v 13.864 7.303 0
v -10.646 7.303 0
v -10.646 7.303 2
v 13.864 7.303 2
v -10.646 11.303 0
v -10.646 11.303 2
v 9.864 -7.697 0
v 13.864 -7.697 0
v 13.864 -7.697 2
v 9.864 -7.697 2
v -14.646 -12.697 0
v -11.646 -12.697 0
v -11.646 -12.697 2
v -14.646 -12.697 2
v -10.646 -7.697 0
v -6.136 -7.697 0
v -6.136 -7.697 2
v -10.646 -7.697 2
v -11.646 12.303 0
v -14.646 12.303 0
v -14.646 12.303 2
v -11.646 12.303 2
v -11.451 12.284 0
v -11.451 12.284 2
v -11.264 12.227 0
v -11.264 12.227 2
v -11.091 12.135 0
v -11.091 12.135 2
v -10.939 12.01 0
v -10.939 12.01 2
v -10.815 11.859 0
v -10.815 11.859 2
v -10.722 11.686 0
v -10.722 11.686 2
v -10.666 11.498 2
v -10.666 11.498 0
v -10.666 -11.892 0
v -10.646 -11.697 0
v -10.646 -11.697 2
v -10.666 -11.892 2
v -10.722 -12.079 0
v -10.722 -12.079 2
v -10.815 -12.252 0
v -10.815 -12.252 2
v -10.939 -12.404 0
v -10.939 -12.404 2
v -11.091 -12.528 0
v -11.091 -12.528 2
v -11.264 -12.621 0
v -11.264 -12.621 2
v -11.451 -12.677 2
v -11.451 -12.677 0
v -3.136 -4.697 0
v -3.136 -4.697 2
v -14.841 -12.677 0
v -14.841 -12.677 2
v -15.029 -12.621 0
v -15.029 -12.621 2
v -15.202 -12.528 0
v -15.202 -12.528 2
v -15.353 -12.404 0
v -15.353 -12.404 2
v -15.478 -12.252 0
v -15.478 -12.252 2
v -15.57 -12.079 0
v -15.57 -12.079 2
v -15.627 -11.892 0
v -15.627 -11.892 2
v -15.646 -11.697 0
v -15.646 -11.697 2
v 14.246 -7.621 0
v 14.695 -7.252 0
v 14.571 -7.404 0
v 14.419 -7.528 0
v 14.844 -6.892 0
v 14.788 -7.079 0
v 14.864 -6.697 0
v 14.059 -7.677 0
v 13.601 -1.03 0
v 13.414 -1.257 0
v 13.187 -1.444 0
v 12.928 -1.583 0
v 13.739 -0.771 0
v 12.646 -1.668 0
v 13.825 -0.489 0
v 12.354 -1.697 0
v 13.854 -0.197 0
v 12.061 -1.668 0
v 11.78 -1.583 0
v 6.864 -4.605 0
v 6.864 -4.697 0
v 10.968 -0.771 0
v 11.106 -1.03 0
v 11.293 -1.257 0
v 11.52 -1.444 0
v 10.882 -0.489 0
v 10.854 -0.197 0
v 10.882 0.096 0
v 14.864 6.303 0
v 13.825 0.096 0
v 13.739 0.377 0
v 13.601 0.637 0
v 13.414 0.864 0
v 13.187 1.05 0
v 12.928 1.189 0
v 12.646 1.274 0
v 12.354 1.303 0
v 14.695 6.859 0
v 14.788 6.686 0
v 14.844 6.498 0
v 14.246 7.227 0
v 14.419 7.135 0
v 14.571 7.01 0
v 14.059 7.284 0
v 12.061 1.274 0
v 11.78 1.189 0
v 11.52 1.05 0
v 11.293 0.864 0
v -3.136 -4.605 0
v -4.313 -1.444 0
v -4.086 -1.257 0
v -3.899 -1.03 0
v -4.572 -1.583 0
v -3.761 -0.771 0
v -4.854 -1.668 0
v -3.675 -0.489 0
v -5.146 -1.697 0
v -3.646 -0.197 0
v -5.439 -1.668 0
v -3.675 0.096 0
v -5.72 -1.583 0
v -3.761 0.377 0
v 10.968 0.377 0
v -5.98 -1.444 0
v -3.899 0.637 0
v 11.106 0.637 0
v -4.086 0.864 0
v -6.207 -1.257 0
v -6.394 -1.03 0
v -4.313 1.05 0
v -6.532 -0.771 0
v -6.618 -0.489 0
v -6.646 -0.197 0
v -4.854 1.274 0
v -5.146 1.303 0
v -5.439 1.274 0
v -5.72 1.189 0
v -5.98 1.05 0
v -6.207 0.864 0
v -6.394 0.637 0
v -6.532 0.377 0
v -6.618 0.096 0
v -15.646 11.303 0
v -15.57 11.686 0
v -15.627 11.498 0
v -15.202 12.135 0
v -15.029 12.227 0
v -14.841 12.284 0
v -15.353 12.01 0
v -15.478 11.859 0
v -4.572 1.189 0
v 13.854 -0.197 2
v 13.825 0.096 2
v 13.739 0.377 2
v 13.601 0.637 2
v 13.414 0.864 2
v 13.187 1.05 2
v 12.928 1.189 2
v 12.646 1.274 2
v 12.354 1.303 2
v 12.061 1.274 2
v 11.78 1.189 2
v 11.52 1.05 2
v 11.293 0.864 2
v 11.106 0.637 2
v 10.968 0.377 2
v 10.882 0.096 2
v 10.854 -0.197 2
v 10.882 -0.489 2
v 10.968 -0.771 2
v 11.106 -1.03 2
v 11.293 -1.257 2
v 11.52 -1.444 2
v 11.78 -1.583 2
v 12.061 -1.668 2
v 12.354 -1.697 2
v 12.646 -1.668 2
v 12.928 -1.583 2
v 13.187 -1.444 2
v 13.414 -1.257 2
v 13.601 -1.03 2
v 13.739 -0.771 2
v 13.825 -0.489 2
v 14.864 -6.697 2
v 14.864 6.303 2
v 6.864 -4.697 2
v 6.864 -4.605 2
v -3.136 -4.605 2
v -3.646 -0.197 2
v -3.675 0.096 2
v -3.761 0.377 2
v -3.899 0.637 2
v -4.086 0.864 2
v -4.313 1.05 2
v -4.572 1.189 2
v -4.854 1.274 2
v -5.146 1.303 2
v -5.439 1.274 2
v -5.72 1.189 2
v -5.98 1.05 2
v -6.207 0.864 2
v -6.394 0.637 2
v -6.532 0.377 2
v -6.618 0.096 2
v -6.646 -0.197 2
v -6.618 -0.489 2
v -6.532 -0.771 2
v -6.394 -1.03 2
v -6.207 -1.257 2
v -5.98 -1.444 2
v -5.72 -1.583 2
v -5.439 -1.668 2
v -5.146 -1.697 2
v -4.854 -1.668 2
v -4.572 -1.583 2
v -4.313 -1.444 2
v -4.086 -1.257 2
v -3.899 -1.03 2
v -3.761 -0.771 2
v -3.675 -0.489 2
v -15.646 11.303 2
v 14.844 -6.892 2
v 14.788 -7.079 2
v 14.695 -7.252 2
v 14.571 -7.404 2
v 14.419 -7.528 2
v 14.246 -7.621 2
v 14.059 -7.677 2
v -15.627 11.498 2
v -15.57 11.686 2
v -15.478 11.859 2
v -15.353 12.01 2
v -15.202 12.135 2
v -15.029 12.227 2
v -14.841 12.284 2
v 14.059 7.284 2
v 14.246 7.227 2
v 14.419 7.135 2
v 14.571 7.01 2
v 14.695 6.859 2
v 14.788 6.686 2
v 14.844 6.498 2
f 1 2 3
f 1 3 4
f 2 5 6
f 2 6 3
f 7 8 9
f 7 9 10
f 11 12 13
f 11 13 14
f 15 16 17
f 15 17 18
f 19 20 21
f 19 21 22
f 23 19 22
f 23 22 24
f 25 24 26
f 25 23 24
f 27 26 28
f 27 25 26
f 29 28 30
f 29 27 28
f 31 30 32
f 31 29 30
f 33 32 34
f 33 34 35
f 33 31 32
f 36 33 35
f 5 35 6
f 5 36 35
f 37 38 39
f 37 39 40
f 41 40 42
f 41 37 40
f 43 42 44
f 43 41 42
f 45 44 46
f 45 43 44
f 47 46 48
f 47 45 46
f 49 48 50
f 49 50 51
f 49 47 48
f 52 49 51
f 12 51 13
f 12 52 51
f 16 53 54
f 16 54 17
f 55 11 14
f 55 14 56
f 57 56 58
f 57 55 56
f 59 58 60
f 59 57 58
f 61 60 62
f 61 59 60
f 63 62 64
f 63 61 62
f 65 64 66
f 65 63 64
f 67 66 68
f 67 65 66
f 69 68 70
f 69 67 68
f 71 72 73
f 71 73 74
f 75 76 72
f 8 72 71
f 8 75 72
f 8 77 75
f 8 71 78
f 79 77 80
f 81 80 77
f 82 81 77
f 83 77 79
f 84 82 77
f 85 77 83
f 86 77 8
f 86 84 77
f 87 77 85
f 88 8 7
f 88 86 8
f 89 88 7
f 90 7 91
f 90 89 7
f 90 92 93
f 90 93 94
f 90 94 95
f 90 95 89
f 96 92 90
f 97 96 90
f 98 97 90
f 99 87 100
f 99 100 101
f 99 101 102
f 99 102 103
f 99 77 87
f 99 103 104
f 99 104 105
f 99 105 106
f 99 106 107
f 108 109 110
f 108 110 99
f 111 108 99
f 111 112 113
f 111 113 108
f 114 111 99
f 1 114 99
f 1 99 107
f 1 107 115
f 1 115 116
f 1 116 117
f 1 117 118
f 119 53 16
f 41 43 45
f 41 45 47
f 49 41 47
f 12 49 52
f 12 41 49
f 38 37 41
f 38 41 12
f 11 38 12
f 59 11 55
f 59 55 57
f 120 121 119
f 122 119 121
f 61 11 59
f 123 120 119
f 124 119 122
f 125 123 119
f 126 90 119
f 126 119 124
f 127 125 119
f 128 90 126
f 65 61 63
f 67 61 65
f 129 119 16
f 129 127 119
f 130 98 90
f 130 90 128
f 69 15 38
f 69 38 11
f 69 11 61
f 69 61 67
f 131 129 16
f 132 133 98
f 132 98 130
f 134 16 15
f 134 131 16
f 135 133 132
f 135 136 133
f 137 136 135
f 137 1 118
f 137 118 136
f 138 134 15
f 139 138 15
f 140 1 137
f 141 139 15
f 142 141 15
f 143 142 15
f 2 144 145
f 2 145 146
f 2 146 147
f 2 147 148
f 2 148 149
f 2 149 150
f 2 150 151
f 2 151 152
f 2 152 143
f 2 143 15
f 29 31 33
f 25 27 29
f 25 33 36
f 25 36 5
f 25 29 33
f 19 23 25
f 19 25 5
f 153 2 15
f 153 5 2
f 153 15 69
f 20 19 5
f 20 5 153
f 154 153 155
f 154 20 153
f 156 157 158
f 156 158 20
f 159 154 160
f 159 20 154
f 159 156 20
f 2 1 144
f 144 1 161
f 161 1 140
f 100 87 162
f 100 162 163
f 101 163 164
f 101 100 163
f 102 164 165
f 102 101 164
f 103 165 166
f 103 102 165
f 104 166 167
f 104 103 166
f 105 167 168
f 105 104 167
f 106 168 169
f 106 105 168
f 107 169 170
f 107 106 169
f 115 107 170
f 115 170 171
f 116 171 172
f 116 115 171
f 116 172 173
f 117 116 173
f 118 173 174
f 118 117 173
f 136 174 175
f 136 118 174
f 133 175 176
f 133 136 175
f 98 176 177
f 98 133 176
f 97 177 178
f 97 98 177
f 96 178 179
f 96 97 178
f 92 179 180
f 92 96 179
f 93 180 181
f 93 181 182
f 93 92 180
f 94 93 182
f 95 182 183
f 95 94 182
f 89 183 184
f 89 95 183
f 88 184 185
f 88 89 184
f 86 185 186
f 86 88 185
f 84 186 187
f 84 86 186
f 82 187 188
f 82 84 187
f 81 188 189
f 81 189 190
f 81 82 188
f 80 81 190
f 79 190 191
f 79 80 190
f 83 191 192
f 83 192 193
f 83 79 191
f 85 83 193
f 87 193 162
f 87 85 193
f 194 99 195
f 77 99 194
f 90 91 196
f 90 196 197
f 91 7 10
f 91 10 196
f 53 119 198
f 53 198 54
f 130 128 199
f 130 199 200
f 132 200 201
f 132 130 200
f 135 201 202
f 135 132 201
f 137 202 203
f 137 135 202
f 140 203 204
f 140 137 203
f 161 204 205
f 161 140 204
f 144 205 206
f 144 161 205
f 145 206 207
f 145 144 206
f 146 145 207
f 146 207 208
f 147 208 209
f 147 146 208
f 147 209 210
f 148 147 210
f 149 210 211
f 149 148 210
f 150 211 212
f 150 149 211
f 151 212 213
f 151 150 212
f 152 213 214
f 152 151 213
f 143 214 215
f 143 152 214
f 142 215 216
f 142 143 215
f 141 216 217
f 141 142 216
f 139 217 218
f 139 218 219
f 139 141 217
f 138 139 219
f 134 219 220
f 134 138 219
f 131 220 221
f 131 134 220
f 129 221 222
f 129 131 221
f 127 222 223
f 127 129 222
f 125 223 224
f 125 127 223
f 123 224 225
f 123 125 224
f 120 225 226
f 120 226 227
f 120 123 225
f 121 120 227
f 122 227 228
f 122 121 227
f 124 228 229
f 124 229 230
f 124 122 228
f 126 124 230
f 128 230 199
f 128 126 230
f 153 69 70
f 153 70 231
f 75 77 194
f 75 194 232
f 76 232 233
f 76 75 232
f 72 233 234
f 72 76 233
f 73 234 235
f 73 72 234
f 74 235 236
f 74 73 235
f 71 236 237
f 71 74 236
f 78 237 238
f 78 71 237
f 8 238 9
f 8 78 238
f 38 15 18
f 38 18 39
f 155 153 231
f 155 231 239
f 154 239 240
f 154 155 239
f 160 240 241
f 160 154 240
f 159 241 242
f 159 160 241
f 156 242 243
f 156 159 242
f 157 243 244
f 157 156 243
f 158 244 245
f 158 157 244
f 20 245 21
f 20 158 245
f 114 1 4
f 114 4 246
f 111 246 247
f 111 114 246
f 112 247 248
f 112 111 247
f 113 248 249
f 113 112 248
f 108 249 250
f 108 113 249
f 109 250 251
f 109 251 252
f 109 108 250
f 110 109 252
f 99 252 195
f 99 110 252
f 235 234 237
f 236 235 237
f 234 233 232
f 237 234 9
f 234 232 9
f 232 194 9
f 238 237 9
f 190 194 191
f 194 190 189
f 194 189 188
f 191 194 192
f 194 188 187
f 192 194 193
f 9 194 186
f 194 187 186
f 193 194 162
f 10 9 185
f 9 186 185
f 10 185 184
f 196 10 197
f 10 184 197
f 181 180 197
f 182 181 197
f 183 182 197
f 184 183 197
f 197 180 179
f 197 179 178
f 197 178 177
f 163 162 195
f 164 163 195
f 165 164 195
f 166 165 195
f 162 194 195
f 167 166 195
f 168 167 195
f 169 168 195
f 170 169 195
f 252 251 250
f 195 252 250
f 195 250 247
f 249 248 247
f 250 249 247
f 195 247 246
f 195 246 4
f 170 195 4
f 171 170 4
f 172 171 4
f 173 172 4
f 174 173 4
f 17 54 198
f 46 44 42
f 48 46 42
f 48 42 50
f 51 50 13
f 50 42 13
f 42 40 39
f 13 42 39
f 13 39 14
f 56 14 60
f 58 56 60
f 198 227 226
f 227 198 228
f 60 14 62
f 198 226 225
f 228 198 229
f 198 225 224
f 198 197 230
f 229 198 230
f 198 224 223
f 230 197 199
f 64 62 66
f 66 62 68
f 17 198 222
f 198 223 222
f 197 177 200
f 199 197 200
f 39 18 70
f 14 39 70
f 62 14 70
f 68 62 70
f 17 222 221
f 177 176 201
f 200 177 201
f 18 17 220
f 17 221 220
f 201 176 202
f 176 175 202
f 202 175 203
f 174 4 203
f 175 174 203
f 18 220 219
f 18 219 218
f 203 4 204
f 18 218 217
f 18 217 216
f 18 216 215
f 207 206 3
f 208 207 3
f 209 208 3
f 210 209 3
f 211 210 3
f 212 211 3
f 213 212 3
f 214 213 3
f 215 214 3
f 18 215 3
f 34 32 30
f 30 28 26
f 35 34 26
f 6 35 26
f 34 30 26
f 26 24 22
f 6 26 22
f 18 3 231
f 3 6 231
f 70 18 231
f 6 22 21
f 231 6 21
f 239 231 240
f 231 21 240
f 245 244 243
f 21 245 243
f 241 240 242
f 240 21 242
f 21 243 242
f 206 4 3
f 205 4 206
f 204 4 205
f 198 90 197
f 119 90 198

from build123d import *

# Parameters (mm, degrees)
SKETCH1_R           = 1.5
BOSS_EXTRUDE1_DEPTH = 2


with BuildPart() as part:
    # Sketch1 → Boss-Extrude1 (new body)
    with BuildSketch(Plane.XY):
        with BuildLine():
            Line((-10.646329578, -7.696708369), (-10.646329578, -11.696708369))
            ThreePointArc((-10.646329578, -11.696708369), (-10.939222796, -12.40381515), (-11.646329578, -12.696708369))
            Line((-11.646329578, -12.696708369), (-14.646329578, -12.696708369))
            ThreePointArc((-14.646329578, -12.696708369), (-15.353436359, -12.40381515), (-15.646329578, -11.696708369))
            Line((-15.646329578, -11.696708369), (-15.646329578, 11.303291631))
            ThreePointArc((-15.646329578, 11.303291631), (-15.353436359, 12.010398412), (-14.646329578, 12.303291631))
            Line((-14.646329578, 12.303291631), (-11.646329578, 12.303291631))
            ThreePointArc((-11.646329578, 12.303291631), (-10.939222796, 12.010398412), (-10.646329578, 11.303291631))
            Line((-10.646329578, 11.303291631), (-10.646329578, 7.303291631))
            Line((-10.646329578, 7.303291631), (13.863670422, 7.303291631))
            ThreePointArc((13.863670422, 7.303291631), (14.570777204, 7.010398412), (14.863670422, 6.303291631))
            Line((14.863670422, 6.303291631), (14.863670422, -6.696708369))
            ThreePointArc((14.863670422, -6.696708369), (14.570777204, -7.40381515), (13.863670422, -7.696708369))
            Line((13.863670422, -7.696708369), (9.863670422, -7.696708369))
            Line((9.863670422, -7.696708369), (6.863670422, -4.696708369))
            Line((6.863670422, -4.696708369), (6.863670422, -4.605403467))
            Line((6.863670422, -4.605403467), (-3.136329578, -4.605403467))
            Line((-3.136329578, -4.605403467), (-3.136329578, -4.696708369))
            Line((-3.136329578, -4.696708369), (-6.136329578, -7.696708369))
            Line((-6.136329578, -7.696708369), (-10.646329578, -7.696708369))
        make_face()
        with Locations((12.353670422, -0.196708369)):
            Circle(SKETCH1_R, mode=Mode.SUBTRACT)
        with Locations((-5.146329578, -0.196708369)):
            Circle(SKETCH1_R, mode=Mode.SUBTRACT)
    extrude(amount=BOSS_EXTRUDE1_DEPTH)


solid = part.part
